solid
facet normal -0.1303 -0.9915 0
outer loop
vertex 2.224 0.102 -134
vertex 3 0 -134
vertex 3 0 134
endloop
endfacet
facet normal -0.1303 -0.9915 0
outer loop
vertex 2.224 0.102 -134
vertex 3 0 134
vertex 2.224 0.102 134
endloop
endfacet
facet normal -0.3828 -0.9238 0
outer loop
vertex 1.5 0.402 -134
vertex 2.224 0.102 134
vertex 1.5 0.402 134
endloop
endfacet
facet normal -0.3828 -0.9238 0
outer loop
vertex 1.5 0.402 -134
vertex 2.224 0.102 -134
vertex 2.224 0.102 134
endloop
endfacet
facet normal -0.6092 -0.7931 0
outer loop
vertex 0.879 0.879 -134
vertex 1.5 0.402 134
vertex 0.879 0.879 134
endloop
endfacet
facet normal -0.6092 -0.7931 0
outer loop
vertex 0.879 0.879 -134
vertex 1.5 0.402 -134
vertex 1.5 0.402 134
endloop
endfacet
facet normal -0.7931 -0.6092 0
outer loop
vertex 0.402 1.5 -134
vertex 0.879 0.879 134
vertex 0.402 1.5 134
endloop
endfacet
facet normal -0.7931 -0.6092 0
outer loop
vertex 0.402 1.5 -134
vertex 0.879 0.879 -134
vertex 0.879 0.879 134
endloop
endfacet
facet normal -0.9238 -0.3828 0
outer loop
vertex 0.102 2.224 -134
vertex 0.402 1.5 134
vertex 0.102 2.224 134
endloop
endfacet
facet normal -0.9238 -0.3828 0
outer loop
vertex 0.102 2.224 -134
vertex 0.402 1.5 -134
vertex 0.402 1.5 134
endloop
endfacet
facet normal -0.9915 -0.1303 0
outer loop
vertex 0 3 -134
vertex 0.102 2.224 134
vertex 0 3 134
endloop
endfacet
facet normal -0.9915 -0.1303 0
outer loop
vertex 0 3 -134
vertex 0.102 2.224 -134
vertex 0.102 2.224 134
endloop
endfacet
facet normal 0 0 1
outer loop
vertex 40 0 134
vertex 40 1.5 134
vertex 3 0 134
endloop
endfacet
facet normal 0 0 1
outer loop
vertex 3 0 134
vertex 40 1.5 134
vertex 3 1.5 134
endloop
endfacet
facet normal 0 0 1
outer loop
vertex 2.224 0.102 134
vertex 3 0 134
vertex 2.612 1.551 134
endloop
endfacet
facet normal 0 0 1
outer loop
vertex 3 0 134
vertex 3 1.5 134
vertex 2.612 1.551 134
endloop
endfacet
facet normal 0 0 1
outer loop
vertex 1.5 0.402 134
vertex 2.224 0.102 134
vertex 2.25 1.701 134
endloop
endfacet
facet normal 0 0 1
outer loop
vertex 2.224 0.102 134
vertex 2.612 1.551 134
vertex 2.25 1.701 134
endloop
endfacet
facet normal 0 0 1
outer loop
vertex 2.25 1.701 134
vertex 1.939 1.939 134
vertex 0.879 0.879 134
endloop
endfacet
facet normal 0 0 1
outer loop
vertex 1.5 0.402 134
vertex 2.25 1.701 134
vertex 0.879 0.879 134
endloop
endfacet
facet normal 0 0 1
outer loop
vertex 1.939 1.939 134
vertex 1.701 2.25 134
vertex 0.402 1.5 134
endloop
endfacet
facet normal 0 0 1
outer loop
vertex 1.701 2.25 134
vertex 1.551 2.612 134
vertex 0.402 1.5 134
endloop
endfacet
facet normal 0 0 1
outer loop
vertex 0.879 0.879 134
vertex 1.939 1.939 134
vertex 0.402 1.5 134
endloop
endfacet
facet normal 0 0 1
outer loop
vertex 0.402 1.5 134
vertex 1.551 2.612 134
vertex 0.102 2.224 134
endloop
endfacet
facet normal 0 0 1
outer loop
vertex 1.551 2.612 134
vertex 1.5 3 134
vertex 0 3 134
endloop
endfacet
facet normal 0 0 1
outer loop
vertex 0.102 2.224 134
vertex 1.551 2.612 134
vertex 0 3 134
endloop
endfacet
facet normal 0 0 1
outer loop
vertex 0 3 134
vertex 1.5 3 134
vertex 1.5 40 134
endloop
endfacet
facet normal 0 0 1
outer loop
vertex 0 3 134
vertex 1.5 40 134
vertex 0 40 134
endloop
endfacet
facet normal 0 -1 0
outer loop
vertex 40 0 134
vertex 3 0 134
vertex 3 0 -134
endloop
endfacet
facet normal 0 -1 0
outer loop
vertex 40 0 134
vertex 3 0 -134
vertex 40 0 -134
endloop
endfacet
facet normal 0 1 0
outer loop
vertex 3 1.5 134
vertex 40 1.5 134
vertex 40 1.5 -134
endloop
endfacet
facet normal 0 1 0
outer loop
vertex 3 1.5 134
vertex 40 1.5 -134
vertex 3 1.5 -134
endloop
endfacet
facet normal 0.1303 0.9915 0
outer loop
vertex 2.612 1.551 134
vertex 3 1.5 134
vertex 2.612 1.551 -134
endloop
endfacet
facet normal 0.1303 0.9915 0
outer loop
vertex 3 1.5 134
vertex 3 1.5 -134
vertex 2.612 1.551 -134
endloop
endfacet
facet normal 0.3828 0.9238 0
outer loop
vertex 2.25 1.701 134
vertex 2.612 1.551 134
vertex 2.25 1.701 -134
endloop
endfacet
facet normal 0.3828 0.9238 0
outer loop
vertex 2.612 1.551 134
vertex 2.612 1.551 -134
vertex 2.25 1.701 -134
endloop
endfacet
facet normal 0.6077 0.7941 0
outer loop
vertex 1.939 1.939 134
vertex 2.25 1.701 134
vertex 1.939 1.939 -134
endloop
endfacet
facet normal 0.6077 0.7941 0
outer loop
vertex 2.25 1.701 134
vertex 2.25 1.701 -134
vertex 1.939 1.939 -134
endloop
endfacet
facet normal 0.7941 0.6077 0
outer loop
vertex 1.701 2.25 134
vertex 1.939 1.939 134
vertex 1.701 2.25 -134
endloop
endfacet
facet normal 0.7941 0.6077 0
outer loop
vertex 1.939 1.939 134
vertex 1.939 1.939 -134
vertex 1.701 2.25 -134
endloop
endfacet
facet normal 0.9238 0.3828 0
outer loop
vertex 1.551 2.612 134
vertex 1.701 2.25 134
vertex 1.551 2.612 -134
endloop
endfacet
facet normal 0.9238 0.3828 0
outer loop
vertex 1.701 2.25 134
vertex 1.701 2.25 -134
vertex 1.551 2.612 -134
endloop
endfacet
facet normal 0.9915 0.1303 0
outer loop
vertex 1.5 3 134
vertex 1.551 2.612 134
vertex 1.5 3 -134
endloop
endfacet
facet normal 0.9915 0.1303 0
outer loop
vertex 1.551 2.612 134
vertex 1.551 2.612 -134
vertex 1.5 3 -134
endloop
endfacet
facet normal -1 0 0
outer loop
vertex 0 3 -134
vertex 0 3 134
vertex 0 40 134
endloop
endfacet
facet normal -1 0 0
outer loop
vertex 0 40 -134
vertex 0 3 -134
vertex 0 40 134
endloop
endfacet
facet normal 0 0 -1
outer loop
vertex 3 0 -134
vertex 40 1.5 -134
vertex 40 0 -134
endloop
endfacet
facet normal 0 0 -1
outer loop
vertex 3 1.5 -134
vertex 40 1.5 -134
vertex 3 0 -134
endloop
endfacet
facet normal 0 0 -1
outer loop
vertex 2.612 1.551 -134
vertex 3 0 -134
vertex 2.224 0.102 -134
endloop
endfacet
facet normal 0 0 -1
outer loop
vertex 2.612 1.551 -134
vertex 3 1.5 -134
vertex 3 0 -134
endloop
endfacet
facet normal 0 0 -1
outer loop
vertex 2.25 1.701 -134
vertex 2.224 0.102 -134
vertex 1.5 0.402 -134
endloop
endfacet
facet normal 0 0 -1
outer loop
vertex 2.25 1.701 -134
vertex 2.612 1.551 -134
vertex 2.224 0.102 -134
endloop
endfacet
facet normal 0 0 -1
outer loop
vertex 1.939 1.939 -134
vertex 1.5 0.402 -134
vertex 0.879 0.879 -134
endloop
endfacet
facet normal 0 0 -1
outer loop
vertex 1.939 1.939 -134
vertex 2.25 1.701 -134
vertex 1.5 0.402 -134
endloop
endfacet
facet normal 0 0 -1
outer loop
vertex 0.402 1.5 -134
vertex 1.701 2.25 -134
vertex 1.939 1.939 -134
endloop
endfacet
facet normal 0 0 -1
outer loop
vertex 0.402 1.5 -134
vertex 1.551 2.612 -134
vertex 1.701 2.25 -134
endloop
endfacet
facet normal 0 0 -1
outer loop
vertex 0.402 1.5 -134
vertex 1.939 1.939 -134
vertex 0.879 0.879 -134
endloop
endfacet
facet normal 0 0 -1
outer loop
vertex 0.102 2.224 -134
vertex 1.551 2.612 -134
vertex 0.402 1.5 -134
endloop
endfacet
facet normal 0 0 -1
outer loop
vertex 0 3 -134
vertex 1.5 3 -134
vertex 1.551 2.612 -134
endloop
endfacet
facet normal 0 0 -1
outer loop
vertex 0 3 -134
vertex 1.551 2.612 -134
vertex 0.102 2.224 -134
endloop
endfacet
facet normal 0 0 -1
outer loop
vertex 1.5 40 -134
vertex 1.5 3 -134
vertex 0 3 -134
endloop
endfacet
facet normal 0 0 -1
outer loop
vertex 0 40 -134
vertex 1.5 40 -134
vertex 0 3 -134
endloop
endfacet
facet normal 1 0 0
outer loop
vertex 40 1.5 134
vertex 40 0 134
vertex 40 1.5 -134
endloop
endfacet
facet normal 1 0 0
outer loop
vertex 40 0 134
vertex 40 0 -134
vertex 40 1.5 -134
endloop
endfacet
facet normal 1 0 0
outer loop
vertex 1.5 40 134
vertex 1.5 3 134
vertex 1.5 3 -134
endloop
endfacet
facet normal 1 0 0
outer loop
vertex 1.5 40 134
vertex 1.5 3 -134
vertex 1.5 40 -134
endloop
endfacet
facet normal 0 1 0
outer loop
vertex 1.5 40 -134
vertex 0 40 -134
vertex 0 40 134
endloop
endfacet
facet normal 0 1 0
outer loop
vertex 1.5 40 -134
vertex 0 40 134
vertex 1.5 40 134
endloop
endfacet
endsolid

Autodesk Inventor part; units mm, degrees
ref_plane "YZ Plane" through (0, 0, 0) normal (1, 0, 0) x (0, 1, 0)
ref_plane "XZ Plane" through (0, 0, 0) normal (0, 1, 0) x (-1, 0, 0)
ref_plane "XY Plane" through (0, 0, 0) normal (0, 0, 1) x (1, 0, 0)
sketch "Sketch1" plane through (0, 0, 0) normal (0, 0, 1) x (1, 0, 0)
  line L0 (0, 0) -> (0, 40)
  line L1 (0, 0) -> (40, 0)
  dimension "d0" = 40
  dimension "d1" = 40
contour flange "Contour Flange1" sketch "Sketch1" thickness 1.5 bend radius 1.5 width 268 along (0, 0, 1) mid plane yes both sides no wall seen from (0, 20, 0) lies toward (1, 0, 0) curves L0 L1
bend "Bend1"
corner "Corner1"
equation "\"d2\" = BendReliefWidth"
equation "\"d3\" = BendReliefDepth"
equation "\"d4\" = MinimumRemnant"
equation "\"d5\" = BendRadius"
equation "\"d7\" = BendRadius"
equation "\"d9\" = CornerReliefSize"
equation "\"d10\" = GapSize"
equation "\"d11\" = JacobiRadiusSize"
equation "\"BendRadius\" = Thickness"
equation "\"BendReliefWidth\" = Thickness"
equation "\"BendReliefDepth\" = 0.5 * Thickness"
equation "\"CornerReliefSize\" = 4 * Thickness"
equation "\"MinimumRemnant\" = 2 * Thickness"
equation "\"TransitionRadius\" = BendRadius"
equation "\"JacobiRadiusSize\" = BendRadius"
equation "\"GapSize\" = Thickness"
equation "\"Thickness\" = 1.5"
properties part number "L 40x40x268" material "Stainless Steel"
